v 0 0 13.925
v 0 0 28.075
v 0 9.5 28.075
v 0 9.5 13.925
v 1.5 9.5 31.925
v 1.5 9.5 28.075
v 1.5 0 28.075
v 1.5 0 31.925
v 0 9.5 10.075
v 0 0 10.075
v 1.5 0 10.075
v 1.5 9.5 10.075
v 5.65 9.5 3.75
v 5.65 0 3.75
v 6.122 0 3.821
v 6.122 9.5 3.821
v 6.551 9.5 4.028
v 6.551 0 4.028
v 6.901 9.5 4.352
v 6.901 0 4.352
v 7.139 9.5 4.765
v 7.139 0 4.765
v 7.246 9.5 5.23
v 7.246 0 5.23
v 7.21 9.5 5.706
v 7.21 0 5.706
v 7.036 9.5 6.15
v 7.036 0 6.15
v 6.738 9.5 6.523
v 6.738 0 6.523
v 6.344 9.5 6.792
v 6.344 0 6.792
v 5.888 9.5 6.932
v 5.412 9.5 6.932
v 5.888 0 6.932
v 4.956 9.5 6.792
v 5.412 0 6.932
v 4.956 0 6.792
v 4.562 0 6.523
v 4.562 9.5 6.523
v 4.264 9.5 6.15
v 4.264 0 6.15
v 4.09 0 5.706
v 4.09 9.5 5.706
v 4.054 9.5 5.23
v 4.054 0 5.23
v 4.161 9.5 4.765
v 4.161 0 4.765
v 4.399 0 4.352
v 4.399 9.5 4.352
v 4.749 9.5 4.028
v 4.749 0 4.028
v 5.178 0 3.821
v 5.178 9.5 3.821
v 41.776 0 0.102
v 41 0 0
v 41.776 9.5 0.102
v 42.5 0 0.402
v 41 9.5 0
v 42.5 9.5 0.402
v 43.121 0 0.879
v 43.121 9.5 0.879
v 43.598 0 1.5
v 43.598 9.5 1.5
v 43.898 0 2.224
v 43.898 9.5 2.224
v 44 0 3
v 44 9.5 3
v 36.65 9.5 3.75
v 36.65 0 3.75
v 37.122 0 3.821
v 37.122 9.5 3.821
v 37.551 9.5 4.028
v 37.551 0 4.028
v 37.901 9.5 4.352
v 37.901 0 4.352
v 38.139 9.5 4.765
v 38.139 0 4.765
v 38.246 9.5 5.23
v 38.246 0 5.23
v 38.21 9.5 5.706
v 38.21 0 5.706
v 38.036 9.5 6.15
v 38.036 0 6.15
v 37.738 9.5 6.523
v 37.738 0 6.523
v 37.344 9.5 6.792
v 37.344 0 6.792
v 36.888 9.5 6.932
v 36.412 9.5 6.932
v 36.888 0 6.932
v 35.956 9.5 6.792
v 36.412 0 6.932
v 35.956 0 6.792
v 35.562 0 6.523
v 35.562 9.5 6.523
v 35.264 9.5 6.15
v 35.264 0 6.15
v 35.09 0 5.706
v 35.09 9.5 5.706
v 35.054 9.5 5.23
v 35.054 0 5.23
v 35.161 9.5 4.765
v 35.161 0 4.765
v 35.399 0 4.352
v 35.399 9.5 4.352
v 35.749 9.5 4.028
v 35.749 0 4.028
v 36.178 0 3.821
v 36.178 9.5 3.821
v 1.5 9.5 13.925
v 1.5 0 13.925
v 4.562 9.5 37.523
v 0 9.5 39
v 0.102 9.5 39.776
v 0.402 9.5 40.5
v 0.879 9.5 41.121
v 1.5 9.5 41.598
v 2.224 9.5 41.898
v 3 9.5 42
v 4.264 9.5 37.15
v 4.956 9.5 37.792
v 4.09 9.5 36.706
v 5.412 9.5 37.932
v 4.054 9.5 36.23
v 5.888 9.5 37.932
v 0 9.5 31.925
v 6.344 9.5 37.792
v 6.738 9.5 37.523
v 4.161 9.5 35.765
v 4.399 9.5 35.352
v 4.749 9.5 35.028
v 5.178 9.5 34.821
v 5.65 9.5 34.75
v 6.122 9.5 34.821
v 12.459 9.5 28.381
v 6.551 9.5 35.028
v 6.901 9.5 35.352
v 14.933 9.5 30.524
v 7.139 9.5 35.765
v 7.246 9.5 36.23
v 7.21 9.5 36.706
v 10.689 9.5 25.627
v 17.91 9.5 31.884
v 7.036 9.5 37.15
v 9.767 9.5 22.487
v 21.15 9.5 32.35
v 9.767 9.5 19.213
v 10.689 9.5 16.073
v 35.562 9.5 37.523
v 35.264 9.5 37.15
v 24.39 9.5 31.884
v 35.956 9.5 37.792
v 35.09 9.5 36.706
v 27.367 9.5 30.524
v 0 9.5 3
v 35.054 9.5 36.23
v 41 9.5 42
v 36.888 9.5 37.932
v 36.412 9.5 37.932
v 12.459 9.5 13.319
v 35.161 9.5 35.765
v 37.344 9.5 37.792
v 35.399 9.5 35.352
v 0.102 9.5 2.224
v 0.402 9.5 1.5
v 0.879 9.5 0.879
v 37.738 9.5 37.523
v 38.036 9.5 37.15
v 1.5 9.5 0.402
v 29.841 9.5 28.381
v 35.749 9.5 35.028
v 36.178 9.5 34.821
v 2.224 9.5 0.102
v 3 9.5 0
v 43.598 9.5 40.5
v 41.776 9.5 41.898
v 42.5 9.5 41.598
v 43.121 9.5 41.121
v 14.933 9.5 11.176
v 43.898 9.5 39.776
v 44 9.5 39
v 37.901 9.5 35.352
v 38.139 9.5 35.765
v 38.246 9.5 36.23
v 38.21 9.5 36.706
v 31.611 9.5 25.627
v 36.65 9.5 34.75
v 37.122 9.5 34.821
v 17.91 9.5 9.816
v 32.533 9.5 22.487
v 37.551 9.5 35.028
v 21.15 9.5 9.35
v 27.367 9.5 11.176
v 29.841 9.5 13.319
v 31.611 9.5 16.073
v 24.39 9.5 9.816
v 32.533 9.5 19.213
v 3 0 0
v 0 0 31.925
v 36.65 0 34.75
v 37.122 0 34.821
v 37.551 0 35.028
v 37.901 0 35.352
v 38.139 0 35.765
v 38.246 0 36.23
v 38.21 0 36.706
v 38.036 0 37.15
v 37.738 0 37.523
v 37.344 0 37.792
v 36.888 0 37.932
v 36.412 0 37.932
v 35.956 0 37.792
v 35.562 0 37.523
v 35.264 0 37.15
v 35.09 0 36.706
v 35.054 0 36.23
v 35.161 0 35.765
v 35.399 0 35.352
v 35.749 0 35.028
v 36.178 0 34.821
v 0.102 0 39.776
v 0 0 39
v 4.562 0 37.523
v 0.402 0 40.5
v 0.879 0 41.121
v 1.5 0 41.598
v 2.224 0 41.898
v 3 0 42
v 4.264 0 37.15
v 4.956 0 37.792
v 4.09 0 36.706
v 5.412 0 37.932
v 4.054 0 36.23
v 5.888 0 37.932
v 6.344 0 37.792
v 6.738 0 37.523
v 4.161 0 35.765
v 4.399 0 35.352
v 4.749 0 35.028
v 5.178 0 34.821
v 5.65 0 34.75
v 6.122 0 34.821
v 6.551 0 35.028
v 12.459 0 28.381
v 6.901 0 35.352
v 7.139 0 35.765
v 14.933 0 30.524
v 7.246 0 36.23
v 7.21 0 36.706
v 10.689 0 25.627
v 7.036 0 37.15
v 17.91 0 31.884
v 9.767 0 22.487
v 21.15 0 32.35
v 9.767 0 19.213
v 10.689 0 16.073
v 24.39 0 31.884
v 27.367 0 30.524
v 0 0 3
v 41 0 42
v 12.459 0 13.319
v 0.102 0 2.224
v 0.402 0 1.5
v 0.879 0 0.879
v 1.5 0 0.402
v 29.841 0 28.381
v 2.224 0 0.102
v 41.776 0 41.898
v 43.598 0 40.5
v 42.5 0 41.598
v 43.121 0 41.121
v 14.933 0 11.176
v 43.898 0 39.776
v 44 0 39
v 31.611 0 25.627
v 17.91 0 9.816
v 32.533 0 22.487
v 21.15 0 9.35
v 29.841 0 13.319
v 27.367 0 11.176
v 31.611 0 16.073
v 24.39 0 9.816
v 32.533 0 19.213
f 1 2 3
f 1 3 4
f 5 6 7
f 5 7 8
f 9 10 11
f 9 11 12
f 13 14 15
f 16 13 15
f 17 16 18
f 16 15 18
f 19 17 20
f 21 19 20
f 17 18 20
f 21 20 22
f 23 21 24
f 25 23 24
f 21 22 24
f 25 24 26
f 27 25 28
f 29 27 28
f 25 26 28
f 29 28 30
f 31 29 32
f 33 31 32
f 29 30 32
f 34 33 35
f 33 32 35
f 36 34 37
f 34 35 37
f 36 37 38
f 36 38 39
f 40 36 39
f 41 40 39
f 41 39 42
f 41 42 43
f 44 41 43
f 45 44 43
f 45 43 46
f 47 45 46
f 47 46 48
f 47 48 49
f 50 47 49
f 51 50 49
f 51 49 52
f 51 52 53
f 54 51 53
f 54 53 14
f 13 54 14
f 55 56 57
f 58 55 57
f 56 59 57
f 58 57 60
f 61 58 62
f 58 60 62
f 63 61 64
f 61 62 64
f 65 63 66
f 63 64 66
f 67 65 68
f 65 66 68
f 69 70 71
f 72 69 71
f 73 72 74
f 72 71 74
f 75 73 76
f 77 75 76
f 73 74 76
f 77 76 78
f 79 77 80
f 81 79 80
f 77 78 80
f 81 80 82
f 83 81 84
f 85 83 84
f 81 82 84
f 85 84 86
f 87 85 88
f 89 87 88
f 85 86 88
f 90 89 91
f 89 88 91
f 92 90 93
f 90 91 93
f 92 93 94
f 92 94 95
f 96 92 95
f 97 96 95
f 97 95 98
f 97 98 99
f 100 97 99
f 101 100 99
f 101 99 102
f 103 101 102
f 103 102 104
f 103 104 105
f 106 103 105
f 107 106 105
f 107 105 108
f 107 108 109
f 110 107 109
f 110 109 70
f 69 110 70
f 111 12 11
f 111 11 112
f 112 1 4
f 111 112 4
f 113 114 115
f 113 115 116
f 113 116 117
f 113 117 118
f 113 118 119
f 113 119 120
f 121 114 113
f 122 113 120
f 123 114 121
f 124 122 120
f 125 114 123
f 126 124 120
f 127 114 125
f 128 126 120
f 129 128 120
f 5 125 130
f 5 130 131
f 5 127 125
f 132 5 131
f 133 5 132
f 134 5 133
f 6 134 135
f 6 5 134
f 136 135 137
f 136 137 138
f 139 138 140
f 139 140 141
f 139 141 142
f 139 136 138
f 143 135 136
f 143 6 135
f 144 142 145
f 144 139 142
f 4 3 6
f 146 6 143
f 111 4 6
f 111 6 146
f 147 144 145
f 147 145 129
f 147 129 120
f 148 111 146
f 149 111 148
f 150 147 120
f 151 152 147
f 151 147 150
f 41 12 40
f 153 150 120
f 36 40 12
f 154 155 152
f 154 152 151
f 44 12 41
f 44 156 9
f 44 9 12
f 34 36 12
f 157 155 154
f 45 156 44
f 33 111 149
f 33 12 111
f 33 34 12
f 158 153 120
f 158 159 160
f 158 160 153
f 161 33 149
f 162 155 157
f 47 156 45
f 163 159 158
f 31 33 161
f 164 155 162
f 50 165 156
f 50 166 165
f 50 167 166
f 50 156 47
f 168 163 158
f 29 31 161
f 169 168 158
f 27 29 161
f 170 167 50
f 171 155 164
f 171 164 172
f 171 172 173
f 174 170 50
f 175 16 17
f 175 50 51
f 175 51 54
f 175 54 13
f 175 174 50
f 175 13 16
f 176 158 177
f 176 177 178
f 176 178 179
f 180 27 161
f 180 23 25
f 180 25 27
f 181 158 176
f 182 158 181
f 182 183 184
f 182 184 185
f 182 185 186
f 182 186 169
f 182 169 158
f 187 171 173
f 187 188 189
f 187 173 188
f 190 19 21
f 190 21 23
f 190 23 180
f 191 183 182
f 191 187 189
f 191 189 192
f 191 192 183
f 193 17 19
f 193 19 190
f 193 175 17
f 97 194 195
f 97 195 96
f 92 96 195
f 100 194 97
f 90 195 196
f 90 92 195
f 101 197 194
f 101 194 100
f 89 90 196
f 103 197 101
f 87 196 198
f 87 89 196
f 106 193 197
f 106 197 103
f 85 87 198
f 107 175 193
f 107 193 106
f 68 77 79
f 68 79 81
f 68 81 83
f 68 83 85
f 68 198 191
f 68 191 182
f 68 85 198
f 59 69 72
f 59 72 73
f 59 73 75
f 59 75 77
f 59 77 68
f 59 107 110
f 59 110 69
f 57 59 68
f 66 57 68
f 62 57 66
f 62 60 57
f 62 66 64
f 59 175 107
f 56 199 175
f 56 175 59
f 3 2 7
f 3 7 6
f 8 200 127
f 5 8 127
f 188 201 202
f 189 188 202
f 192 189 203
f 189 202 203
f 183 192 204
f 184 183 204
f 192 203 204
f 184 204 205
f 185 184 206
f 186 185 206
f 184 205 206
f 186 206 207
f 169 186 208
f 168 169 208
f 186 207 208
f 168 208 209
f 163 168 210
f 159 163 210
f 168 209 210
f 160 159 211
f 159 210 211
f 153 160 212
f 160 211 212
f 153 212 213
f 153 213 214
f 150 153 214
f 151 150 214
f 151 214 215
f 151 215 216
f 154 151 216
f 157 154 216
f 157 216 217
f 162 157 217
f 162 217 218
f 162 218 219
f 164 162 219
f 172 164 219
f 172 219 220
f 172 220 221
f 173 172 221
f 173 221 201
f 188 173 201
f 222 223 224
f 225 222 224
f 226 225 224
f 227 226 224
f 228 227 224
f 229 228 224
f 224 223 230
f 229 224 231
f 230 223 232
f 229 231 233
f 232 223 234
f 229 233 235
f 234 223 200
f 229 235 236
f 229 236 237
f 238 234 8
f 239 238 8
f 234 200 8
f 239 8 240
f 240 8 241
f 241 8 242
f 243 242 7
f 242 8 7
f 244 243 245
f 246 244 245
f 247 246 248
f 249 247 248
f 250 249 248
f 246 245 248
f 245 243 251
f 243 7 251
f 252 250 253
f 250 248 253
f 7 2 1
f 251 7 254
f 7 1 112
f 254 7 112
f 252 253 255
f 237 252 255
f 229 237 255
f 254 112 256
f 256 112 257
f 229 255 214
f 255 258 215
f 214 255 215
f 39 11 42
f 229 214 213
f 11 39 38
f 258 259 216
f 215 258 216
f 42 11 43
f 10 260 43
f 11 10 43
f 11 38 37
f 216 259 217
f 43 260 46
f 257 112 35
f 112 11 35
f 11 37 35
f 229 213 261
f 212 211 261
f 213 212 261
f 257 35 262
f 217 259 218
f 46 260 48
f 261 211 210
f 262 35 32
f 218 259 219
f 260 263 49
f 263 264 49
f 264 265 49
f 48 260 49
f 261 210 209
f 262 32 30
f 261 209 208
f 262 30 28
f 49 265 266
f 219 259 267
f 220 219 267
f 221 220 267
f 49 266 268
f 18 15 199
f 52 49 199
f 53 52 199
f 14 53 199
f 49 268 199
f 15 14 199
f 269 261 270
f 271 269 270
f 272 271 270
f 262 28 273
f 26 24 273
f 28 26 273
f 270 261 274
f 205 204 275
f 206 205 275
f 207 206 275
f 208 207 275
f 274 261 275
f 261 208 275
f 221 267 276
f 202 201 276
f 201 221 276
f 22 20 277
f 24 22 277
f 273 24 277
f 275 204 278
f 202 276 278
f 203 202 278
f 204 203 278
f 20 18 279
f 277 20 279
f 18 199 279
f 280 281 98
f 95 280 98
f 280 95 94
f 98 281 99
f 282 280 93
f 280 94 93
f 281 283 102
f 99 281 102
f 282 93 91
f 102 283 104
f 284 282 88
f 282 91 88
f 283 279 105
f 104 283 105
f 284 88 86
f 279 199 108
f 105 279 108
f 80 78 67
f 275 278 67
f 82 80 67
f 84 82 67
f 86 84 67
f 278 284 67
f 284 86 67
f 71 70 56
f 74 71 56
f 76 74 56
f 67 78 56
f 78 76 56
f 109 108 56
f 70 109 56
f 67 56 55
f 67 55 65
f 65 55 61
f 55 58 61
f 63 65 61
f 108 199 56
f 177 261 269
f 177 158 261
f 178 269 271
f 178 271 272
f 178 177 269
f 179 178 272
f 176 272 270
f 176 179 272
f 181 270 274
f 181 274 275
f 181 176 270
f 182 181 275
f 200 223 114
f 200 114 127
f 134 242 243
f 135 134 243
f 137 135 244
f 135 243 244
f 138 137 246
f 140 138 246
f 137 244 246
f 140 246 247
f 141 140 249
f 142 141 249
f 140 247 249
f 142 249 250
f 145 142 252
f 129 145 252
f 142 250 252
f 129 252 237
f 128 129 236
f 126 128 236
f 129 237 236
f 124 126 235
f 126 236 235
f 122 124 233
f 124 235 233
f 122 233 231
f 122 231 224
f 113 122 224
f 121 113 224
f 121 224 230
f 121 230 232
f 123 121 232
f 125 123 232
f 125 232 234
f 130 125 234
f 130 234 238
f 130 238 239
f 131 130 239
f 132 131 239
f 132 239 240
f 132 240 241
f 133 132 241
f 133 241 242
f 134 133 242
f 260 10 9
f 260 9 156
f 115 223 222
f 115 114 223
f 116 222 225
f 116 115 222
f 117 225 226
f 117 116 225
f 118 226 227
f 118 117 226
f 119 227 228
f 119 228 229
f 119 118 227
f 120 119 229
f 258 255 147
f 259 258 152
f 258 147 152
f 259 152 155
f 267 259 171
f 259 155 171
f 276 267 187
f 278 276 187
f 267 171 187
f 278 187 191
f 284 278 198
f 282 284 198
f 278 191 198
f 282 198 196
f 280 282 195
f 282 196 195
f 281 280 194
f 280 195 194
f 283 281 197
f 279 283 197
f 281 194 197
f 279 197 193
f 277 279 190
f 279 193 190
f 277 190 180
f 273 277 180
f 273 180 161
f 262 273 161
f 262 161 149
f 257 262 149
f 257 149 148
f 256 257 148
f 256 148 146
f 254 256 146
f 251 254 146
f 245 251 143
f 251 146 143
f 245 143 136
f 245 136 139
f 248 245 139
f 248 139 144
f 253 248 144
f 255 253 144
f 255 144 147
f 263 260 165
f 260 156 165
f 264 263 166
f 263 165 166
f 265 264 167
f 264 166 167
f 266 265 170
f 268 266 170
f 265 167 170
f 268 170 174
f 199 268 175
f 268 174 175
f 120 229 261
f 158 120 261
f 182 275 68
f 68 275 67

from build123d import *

# Parameters (mm, degrees)
SKETCH_1_W          = 44
SKETCH_1_H          = 42
EXTRUDE_1_DEPTH     = 9.5
SKETCH_2_R          = 11.5
CUT_EXTRUDE_1_DEPTH = 62.565006294
FILLET_1_R          = 3
SKETCH_5_R          = 1.6
CUT_EXTRUDE_2_DEPTH = 62.565006294
SKETCH_8_W          = 3.85
SKETCH_8_H          = 9.5
CUT_EXTRUDE_3_DEPTH = 1.5


with BuildPart() as part:
    # 草图1 → 凸台-拉伸1 (new body)
    with BuildSketch(Plane(origin=(0, 0, 0), x_dir=(1, 0, 0), z_dir=(0, 1, 0))):
        with Locations((22, -21)):
            Rectangle(SKETCH_1_W, SKETCH_1_H)
    extrude(amount=EXTRUDE_1_DEPTH)

    # 草图2 → 切除-拉伸1 (cut, through all)
    with BuildSketch(Plane(origin=(0, 9.5, 0), x_dir=(1, 0, 0), z_dir=(0, 1, 0))):
        with Locations(Location((21.15, -20.85, 0), (0, 0, 270))):
            Circle(SKETCH_2_R)
    extrude(amount=-CUT_EXTRUDE_1_DEPTH, mode=Mode.SUBTRACT)

    # 圆角1
    fillet_1_edges = [part.edges().sort_by_distance(p)[0] for p in [
        (0, 4.75, 0),
        (44, 4.75, 0),
        (44, 4.75, 42),
        (0, 4.75, 42),
    ]]
    fillet(fillet_1_edges, radius=FILLET_1_R)

    # 草图5 → 切除-拉伸2 (cut, through all)
    with BuildSketch(Plane.XZ):
        with Locations(Location((36.65, 36.35, 0), (0, 0, 270))):
            Circle(SKETCH_5_R)
        with Locations(Location((5.65, 36.35, 0), (0, 0, 270))):
            Circle(SKETCH_5_R)
        with Locations(Location((5.65, 5.35, 0), (0, 0, 270))):
            Circle(SKETCH_5_R)
        with Locations(Location((36.65, 5.35, 0), (0, 0, 270))):
            Circle(SKETCH_5_R)
    extrude(amount=-CUT_EXTRUDE_2_DEPTH, mode=Mode.SUBTRACT)

    # 草图8 → 切除-拉伸3 (cut)
    with BuildSketch(Plane.ZY):
        with Locations((12, 4.75)):
            Rectangle(SKETCH_8_W, SKETCH_8_H)
        with Locations((30, 4.75)):
            Rectangle(SKETCH_8_W, SKETCH_8_H)
    extrude(amount=-CUT_EXTRUDE_3_DEPTH, mode=Mode.SUBTRACT)


solid = part.part
